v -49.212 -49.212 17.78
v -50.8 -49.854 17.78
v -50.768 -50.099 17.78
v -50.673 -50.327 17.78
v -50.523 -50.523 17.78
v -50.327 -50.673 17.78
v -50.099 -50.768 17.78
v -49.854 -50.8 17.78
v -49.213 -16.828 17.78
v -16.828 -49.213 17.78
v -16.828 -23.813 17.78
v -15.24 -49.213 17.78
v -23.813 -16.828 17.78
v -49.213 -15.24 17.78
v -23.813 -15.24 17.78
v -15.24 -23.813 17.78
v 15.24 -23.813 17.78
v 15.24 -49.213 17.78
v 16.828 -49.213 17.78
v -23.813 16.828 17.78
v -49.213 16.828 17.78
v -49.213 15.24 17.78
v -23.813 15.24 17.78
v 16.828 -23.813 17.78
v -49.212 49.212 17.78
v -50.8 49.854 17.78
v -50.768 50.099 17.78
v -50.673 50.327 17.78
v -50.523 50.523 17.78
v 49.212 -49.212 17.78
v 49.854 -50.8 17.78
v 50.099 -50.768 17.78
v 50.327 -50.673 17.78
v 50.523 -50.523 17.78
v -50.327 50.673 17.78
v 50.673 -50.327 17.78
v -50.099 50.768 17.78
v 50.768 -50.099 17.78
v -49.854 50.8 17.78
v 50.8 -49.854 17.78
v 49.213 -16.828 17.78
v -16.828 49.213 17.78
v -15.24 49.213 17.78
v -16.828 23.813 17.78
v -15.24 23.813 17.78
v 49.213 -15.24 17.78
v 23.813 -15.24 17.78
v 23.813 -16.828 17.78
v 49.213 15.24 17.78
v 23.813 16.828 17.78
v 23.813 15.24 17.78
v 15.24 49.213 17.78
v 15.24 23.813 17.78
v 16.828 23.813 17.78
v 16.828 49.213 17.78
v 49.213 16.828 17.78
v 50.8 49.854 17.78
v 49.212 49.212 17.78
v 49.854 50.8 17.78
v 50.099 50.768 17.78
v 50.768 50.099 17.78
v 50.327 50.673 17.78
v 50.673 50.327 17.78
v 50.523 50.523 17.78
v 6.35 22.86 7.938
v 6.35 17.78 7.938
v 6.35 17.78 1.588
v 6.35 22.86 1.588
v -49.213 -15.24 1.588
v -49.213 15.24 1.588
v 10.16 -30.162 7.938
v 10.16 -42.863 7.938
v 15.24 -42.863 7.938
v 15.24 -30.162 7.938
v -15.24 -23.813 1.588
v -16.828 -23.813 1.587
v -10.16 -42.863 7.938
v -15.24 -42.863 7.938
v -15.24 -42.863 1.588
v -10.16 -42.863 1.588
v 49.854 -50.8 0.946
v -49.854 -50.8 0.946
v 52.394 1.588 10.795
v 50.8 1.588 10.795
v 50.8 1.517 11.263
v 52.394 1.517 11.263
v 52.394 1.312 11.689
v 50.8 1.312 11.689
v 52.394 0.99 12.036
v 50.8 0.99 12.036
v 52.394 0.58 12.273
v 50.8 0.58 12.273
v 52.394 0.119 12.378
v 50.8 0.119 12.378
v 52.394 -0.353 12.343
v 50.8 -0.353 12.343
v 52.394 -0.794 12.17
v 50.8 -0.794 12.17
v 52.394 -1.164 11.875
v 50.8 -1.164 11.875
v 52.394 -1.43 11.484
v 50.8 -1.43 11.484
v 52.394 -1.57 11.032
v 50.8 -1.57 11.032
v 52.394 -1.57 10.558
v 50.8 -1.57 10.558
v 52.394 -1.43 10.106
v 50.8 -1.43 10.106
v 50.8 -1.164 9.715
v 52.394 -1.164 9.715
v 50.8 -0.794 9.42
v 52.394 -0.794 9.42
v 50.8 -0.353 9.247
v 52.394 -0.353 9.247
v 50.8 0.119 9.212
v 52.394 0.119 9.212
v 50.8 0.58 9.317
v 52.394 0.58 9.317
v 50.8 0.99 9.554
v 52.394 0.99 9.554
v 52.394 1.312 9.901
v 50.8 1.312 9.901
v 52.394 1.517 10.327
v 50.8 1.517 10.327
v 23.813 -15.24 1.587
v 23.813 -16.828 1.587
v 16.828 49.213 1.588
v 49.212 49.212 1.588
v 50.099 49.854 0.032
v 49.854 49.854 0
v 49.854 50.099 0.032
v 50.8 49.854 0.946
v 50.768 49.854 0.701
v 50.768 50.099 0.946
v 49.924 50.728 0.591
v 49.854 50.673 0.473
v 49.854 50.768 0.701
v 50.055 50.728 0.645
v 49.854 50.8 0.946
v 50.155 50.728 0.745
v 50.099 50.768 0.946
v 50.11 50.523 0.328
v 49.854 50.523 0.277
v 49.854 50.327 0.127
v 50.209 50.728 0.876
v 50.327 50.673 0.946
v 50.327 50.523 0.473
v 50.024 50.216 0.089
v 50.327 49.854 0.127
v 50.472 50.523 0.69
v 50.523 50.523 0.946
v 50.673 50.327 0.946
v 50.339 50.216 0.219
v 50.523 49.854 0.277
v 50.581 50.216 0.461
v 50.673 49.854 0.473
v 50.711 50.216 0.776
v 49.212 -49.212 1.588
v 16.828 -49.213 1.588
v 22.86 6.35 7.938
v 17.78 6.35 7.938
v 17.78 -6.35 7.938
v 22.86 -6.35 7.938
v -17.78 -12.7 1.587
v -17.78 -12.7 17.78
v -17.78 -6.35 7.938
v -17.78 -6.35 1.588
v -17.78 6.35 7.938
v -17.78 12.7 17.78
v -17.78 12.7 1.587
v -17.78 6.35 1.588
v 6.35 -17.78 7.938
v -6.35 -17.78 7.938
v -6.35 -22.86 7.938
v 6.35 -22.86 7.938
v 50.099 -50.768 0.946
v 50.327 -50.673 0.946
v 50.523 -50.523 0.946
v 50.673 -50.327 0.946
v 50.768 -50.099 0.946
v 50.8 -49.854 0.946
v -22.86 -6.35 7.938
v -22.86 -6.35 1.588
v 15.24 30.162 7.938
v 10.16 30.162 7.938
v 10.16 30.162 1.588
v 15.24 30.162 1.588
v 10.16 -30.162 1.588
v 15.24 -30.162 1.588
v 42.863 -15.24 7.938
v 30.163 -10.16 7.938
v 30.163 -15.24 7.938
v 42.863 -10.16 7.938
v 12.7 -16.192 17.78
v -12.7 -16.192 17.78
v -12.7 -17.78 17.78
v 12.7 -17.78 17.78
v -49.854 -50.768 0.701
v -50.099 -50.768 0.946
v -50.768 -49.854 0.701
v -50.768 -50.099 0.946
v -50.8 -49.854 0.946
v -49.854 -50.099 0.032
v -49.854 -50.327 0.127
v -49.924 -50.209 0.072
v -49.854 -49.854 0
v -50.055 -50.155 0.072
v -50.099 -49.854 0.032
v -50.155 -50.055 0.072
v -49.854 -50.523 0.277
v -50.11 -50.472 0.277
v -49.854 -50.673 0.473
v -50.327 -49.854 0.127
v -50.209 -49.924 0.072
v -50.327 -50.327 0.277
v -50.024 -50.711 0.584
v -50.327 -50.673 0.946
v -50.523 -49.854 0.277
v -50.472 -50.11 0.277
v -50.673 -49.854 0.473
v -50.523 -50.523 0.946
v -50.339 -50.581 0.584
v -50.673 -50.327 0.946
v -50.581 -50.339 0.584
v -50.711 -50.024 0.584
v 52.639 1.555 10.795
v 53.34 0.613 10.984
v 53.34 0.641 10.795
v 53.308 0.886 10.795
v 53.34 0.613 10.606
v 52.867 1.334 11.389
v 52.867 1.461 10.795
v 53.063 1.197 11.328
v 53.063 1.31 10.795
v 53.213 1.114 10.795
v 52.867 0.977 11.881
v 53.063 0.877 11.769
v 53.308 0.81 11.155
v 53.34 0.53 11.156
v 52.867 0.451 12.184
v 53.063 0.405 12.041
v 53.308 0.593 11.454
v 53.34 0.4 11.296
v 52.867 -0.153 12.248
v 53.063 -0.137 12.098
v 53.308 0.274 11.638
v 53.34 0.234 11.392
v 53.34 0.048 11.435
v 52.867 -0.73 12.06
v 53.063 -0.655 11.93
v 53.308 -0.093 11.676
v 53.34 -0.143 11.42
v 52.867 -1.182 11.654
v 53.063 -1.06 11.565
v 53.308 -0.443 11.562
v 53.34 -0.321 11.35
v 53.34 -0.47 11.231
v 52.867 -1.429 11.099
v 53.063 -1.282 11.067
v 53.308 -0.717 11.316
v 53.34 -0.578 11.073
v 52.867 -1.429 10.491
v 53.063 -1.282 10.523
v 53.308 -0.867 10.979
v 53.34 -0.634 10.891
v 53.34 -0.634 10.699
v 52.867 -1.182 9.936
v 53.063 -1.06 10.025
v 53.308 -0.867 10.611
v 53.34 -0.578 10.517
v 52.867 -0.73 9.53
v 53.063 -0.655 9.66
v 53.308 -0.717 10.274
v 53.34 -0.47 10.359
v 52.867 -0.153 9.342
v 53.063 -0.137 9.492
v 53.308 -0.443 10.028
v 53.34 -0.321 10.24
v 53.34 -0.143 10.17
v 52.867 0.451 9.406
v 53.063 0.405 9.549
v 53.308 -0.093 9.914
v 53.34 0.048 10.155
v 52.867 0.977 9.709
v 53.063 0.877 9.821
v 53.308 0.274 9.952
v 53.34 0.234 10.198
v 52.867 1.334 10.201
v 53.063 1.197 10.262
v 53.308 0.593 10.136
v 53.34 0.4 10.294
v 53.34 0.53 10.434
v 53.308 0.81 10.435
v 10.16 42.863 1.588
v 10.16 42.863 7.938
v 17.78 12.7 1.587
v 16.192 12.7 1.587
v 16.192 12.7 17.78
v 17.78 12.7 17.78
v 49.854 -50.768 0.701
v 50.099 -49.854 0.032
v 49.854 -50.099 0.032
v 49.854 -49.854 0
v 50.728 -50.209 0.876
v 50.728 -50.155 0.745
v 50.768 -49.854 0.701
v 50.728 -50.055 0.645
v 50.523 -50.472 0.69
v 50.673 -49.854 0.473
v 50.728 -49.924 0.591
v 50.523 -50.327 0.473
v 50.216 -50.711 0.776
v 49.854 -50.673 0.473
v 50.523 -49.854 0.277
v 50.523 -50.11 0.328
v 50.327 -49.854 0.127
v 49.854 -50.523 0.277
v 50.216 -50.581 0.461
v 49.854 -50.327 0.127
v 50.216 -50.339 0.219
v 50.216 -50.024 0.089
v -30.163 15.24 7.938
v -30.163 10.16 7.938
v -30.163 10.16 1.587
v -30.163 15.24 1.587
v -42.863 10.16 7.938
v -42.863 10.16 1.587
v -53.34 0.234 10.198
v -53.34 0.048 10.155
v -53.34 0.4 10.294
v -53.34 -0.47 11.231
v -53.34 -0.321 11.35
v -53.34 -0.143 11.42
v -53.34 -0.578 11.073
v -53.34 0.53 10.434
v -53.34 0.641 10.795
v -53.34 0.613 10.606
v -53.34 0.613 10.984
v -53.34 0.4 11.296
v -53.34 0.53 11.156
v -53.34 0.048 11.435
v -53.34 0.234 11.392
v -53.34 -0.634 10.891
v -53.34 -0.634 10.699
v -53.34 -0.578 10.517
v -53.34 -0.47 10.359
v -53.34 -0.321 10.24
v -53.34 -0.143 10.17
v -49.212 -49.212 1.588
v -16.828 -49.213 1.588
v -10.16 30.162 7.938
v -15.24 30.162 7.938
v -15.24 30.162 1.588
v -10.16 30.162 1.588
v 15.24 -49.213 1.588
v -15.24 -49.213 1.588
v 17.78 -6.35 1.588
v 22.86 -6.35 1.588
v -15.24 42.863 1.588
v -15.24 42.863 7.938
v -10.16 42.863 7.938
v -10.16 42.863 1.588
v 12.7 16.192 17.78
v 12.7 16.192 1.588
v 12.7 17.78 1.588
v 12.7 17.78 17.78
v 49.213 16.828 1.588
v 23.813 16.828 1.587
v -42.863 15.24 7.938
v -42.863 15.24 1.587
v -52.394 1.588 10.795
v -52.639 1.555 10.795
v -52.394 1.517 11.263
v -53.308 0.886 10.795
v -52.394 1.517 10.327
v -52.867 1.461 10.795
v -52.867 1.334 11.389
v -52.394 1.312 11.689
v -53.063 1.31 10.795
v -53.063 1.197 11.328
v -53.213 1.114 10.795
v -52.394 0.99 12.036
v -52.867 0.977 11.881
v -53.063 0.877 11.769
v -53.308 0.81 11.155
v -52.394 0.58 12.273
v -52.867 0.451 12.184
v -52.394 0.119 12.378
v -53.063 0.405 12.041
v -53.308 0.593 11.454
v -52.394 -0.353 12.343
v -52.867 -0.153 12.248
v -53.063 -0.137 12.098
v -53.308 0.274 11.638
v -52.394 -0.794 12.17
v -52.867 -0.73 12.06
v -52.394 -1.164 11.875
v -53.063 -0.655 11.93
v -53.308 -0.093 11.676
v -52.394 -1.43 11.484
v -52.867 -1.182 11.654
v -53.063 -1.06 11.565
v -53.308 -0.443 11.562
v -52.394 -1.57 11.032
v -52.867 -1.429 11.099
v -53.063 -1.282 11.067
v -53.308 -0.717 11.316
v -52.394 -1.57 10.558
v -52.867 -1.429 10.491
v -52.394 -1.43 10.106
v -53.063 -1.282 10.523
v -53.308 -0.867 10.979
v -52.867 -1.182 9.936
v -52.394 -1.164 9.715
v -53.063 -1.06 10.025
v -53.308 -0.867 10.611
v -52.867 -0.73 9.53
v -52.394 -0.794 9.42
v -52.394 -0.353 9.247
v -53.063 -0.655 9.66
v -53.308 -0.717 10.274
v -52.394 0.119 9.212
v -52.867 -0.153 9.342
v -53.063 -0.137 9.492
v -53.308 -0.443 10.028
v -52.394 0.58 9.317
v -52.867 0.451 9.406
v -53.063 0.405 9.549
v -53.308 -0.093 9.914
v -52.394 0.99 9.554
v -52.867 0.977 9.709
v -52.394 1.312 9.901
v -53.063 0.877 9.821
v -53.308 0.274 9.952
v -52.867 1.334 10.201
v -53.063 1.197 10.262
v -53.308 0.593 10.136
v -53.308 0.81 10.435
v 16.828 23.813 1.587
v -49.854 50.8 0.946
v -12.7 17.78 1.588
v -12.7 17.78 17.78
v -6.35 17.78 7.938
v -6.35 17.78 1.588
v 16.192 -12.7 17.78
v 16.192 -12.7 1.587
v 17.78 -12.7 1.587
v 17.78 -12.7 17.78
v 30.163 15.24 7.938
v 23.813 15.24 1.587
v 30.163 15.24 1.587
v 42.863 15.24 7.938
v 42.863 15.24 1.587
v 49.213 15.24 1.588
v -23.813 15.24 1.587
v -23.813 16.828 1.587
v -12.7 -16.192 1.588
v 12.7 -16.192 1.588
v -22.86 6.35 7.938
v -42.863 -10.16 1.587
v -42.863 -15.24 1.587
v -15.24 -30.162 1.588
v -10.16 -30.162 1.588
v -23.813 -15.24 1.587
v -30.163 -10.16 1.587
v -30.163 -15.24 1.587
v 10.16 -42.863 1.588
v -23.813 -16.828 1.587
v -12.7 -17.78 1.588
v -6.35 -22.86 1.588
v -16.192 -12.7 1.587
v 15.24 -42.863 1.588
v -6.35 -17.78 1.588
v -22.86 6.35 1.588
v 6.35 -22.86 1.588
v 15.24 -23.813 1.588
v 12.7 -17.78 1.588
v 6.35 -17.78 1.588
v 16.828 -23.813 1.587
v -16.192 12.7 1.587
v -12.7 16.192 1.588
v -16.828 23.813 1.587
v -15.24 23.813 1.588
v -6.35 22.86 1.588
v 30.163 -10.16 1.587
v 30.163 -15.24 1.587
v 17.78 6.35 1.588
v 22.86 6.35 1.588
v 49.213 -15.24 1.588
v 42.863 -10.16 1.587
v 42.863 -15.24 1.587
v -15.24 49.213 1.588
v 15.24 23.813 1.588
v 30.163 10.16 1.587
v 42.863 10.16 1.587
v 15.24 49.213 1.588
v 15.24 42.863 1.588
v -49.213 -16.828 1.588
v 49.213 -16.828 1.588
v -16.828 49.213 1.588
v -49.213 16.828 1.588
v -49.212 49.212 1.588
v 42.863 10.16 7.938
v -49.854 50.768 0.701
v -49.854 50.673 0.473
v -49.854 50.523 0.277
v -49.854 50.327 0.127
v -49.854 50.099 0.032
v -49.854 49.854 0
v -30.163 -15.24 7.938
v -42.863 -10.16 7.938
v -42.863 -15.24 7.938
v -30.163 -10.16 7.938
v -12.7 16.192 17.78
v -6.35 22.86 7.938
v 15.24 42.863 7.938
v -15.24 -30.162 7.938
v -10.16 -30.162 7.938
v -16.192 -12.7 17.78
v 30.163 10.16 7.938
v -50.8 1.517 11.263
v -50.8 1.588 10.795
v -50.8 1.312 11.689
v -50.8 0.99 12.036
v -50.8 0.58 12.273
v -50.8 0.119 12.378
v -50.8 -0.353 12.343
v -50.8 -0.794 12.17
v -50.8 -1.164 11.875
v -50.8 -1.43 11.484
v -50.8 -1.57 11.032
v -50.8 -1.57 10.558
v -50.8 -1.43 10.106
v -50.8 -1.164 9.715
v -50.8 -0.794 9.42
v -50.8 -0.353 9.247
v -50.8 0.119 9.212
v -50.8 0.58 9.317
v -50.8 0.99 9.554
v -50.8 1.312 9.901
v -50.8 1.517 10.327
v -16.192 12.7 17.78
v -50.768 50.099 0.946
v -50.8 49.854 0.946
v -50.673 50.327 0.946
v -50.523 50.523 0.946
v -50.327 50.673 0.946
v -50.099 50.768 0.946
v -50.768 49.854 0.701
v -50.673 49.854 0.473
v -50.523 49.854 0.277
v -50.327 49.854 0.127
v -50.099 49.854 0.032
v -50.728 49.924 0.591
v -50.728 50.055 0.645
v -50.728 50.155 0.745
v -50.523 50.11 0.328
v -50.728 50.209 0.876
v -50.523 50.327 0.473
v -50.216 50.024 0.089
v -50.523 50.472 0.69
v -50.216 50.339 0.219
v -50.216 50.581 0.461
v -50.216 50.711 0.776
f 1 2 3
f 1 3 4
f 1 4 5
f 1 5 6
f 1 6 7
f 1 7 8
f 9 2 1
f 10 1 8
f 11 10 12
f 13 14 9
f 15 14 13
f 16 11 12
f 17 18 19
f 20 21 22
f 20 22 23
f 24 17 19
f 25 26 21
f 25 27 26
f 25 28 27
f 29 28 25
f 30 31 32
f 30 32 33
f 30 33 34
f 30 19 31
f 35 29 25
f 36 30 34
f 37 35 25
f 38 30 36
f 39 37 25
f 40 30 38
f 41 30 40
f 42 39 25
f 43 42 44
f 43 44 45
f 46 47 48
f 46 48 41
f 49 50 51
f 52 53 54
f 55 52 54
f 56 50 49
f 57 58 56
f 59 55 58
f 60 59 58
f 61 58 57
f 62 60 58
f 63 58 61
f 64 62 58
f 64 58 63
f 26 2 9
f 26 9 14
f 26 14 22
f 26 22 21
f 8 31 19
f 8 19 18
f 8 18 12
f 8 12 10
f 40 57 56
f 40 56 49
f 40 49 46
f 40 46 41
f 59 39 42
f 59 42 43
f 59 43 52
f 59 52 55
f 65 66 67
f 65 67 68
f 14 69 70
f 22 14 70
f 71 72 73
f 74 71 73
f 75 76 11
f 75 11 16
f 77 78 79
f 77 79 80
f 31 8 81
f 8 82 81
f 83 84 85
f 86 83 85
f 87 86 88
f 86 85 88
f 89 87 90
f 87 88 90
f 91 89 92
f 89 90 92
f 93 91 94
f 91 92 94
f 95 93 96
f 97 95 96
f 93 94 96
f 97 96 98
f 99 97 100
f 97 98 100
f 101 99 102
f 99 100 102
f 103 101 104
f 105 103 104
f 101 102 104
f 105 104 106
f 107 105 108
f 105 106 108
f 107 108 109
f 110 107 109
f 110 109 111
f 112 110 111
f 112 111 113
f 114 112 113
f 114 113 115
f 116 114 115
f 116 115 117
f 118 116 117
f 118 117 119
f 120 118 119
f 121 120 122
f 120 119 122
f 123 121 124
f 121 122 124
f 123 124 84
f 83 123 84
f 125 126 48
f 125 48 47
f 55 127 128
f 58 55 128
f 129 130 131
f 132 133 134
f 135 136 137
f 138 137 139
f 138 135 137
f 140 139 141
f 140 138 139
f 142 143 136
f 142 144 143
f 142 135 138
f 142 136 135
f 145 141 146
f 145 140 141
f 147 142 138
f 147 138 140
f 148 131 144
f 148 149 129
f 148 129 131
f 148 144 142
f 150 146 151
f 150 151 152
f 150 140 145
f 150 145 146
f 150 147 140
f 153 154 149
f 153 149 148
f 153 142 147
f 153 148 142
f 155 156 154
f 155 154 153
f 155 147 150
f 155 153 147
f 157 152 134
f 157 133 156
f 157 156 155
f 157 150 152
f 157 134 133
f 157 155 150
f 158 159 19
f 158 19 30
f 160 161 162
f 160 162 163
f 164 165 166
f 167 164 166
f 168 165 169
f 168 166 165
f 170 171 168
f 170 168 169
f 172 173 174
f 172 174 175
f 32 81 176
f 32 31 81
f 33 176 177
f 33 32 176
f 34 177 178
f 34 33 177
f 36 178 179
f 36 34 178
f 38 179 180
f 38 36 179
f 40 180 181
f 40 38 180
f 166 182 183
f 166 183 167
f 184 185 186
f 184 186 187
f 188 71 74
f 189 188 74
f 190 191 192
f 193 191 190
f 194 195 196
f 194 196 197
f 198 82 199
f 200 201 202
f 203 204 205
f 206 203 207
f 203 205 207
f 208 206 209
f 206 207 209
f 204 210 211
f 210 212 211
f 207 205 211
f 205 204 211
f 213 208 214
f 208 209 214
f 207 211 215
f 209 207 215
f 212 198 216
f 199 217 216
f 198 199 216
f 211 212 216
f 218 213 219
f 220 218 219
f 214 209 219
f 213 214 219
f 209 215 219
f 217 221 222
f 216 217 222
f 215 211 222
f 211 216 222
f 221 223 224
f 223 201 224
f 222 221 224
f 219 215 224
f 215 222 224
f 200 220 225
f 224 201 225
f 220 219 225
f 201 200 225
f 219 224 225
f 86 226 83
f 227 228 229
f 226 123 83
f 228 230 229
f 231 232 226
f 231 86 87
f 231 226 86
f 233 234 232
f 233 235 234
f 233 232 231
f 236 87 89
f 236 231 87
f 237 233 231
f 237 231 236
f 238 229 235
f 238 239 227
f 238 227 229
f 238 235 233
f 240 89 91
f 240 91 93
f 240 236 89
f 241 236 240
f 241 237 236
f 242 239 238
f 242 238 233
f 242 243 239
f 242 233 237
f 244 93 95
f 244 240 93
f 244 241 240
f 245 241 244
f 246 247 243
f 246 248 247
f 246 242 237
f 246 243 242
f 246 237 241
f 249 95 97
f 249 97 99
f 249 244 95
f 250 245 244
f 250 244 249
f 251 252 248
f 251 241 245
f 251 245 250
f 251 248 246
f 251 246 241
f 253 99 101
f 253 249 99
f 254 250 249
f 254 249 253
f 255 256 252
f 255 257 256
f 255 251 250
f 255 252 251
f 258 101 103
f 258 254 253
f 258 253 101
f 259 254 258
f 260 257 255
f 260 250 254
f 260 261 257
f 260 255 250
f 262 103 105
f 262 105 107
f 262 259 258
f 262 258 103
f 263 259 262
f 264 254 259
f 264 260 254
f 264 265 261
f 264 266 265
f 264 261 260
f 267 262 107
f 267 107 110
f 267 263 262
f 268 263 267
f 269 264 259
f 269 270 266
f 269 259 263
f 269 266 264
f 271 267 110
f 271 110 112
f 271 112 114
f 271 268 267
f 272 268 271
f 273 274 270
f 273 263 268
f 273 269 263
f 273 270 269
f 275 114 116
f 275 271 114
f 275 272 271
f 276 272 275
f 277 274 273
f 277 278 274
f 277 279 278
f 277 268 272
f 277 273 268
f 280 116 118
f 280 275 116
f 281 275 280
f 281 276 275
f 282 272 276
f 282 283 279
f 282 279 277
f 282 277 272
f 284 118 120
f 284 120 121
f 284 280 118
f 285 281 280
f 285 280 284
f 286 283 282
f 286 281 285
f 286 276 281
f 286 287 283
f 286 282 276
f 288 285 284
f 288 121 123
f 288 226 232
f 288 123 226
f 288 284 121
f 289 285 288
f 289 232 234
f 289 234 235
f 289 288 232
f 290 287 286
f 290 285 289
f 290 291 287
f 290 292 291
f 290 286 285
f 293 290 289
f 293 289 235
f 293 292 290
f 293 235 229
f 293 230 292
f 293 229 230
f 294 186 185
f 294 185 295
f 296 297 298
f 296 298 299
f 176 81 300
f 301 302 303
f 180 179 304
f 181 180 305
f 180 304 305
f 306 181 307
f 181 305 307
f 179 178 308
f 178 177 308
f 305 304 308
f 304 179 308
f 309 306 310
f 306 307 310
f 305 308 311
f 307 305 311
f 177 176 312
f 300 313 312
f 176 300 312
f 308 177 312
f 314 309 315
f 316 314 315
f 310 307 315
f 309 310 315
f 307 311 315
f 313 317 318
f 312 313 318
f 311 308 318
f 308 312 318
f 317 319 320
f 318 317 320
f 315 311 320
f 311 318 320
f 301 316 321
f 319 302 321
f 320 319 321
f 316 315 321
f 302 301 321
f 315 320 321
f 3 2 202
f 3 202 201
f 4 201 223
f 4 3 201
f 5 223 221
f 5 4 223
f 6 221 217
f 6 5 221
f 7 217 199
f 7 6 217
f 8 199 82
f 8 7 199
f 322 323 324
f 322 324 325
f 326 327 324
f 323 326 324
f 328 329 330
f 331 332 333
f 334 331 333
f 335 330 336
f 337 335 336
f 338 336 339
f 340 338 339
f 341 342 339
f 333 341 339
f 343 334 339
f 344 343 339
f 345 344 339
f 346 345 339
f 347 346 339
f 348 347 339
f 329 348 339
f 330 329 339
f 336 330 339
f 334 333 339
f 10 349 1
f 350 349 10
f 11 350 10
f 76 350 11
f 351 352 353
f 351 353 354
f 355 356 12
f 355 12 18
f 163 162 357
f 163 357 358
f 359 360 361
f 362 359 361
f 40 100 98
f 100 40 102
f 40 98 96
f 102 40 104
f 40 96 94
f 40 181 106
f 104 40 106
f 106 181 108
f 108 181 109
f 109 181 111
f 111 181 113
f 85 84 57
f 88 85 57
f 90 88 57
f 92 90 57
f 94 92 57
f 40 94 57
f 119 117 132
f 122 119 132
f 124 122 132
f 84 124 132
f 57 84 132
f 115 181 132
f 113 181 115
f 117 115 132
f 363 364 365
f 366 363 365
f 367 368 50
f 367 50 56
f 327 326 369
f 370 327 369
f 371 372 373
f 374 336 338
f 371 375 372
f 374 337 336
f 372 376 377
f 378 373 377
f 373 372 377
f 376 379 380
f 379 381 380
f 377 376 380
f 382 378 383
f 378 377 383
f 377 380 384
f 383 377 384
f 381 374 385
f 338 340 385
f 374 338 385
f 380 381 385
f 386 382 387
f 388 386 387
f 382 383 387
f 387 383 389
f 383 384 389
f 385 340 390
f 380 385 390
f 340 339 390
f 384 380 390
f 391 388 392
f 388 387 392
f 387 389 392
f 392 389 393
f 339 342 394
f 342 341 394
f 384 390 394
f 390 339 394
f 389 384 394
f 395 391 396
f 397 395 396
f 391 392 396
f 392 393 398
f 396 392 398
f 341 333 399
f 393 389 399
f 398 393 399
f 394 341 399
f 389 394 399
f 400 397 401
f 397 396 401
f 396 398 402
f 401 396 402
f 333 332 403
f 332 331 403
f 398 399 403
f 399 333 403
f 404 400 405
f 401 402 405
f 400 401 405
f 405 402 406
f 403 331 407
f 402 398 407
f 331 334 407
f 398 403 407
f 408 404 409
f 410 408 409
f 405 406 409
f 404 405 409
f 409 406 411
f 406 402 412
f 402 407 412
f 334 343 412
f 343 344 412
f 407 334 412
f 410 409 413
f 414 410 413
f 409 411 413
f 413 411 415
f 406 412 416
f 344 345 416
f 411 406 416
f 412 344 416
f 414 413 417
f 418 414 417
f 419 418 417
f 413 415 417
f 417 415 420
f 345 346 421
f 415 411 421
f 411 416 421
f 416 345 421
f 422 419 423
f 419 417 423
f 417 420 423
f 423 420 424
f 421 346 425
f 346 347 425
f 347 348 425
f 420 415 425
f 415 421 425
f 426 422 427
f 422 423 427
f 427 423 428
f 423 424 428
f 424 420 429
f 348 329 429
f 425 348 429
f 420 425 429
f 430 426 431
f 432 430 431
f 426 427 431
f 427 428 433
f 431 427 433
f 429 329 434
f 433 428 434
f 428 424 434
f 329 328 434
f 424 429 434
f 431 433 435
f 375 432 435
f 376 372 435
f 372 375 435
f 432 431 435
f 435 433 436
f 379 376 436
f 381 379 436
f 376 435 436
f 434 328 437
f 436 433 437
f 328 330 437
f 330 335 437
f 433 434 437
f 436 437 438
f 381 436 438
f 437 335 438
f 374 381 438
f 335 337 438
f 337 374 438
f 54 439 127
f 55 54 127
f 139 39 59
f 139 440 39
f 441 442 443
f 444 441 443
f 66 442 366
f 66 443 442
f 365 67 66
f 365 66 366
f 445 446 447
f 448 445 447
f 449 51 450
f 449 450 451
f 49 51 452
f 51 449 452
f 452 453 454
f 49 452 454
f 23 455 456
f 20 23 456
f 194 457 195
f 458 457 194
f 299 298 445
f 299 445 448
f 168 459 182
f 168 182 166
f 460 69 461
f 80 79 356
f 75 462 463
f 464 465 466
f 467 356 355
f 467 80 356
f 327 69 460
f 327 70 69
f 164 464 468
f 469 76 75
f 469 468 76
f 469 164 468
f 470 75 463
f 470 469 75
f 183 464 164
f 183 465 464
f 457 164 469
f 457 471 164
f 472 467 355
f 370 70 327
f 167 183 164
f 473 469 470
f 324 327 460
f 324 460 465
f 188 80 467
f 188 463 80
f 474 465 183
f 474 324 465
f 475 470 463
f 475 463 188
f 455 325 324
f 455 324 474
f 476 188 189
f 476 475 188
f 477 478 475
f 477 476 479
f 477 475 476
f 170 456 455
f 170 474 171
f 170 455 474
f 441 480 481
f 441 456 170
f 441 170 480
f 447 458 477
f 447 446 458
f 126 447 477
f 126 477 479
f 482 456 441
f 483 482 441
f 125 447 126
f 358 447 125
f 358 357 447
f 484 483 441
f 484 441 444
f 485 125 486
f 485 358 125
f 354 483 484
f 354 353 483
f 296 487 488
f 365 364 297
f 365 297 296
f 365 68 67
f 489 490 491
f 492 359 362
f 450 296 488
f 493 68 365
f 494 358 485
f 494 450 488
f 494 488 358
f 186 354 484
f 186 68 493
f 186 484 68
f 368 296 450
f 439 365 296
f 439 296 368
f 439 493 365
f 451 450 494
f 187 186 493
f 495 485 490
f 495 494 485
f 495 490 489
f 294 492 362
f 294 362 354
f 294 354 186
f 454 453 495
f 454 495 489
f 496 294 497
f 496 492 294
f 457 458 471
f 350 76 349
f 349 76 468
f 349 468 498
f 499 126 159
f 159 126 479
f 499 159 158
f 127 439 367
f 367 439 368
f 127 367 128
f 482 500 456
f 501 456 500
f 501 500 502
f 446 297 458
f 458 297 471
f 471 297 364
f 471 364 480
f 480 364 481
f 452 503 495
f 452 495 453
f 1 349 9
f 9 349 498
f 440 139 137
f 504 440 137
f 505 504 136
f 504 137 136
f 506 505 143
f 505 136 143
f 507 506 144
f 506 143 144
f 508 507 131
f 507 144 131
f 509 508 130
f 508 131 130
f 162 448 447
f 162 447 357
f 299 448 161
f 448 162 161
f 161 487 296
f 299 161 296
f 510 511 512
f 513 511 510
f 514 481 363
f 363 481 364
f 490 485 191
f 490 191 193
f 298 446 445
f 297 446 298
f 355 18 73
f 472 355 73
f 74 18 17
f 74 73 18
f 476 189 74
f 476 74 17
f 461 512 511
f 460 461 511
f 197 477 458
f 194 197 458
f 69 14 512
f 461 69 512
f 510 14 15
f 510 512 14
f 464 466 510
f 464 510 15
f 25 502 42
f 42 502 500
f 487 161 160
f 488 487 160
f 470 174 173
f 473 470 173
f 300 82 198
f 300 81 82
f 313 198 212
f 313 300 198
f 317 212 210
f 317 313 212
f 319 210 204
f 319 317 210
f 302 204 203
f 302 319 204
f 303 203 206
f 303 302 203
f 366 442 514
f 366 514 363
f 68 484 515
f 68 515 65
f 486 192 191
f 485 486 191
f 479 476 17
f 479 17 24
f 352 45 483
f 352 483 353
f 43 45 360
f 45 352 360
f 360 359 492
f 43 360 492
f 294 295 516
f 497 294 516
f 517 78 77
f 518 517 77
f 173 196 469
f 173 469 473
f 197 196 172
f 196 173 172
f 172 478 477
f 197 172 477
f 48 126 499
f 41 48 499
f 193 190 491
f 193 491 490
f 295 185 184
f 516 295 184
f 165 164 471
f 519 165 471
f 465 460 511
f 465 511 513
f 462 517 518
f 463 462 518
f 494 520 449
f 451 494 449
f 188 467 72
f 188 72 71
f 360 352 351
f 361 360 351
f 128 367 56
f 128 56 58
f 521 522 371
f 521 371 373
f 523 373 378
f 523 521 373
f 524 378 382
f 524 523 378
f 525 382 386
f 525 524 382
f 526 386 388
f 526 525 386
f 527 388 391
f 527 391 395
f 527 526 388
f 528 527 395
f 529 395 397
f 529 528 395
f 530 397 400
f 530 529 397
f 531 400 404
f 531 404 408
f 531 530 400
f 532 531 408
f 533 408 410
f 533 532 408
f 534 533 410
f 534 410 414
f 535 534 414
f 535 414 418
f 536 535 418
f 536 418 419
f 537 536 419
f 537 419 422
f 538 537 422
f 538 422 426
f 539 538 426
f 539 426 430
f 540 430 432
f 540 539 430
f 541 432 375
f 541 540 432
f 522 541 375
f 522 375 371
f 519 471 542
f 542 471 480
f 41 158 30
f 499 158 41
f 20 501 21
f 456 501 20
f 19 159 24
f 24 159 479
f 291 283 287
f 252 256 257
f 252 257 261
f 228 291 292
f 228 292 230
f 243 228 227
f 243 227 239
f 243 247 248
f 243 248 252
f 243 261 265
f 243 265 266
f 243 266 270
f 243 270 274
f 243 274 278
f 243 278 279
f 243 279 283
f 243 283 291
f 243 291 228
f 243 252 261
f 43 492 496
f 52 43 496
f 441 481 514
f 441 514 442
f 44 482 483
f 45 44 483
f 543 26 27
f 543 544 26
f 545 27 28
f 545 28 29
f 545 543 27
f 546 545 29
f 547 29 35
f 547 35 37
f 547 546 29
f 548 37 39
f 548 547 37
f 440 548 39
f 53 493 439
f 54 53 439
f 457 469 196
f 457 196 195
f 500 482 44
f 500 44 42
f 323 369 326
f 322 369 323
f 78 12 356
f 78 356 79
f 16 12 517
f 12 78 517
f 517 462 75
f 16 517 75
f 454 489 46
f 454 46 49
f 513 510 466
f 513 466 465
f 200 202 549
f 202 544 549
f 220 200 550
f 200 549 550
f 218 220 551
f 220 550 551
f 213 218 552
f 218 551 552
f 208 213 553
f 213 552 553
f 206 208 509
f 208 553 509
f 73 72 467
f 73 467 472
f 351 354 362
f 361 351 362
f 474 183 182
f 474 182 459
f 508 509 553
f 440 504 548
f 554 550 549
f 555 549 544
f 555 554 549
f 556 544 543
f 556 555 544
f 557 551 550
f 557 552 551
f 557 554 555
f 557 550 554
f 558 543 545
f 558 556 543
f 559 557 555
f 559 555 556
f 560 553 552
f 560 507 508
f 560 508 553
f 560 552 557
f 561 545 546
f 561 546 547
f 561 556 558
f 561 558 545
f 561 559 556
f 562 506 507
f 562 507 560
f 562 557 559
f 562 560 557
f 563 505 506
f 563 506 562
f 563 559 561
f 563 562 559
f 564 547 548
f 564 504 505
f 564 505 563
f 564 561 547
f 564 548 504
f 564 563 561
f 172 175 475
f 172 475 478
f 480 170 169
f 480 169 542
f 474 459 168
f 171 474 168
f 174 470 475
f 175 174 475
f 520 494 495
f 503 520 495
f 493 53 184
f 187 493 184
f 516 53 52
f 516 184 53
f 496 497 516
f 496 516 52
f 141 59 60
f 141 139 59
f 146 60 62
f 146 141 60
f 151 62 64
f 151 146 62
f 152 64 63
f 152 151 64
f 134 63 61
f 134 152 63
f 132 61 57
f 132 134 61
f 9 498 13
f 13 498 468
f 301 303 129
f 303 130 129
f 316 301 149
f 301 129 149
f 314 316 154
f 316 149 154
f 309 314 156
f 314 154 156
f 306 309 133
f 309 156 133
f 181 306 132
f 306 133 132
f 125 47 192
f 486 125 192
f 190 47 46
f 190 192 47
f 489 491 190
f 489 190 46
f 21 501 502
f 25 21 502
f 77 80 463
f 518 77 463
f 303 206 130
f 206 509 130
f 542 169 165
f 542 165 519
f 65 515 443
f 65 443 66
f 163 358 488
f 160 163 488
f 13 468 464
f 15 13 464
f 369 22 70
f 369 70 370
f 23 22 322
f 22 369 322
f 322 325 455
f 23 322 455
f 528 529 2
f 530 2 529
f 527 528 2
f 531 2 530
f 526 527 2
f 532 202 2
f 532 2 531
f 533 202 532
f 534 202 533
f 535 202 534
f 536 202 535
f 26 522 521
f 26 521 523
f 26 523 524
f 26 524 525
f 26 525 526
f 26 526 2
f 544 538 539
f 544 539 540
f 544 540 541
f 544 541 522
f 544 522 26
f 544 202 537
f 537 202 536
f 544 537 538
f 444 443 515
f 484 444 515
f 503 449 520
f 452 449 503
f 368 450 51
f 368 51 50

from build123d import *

# Parameters (mm, degrees)
F0_W     = 101.6
F0_H     = 101.6
F1_DEPTH = 1.5875
F2_W     = 101.6
F2_H     = 101.6
F2_W_2   = 98.425
F2_H_2   = 98.425
F3_DEPTH = 16.1925
F4_W     = 25.4
F4_H     = 1.5875
F4_W_2   = 1.5875
F4_H_2   = 25.4
F5_DEPTH = 16.1925
F6_W     = 12.7
F6_H     = 5.08
F6_W_2   = 5.08
F6_H_2   = 12.7
F7_DEPTH = 6.35
F8_R     = 1.5875
F9_DEPTH = 2.54
F11_R    = 0.94615


with BuildPart() as f1:
    # F0 (on Top) → F1 (new body)
    with BuildSketch(Plane.XY):
        Rectangle(F0_W, F0_H)
    extrude(amount=F1_DEPTH)

    # F2 (on face) → F3 (join)
    with BuildSketch(Plane.XY.offset(1.5875)):
        Rectangle(F2_W, F2_H)
        Rectangle(F2_W_2, F2_H_2, mode=Mode.SUBTRACT)
    extrude(amount=F3_DEPTH)

    # F4 (on face) → F5 (join, through all)
    with BuildSketch(Plane.XY.offset(1.5875)):
        with Locations((-36.5125, -16.03375)):
            Rectangle(F4_W, F4_H)
        with Locations((36.5125, -16.03375)):
            Rectangle(F4_W, F4_H)
        with Locations((-36.5125, 16.03375)):
            Rectangle(F4_W, F4_H)
        with Locations((36.5125, 16.03375)):
            Rectangle(F4_W, F4_H)
        with Locations((16.03375, 36.5125)):
            Rectangle(F4_W_2, F4_H_2)
        with Locations((-16.03375, 36.5125)):
            Rectangle(F4_W_2, F4_H_2)
        with Locations((-16.03375, -36.5125)):
            Rectangle(F4_W_2, F4_H_2)
        with Locations((16.03375, -36.5125)):
            Rectangle(F4_W_2, F4_H_2)
        with Locations((0, 16.98625)):
            Rectangle(F4_W, F4_H)
        with Locations((0, -16.98625)):
            Rectangle(F4_W, F4_H)
        with Locations((-16.98625, 0)):
            Rectangle(F4_W_2, F4_H_2)
        with Locations((16.98625, 0)):
            Rectangle(F4_W_2, F4_H_2)
    extrude(amount=F5_DEPTH)

    # F6 (on face) → F7 (join)
    with BuildSketch(Plane.XY.offset(1.5875)):
        with Locations((-36.5125, 12.7)):
            Rectangle(F6_W, F6_H)
        with Locations((-36.5125, -12.7)):
            Rectangle(F6_W, F6_H)
        with Locations((-12.7, 36.5125)):
            Rectangle(F6_W_2, F6_H_2)
        with Locations((12.7, 36.5125)):
            Rectangle(F6_W_2, F6_H_2)
        with Locations((36.5125, 12.7)):
            Rectangle(F6_W, F6_H)
        with Locations((36.5125, -12.7)):
            Rectangle(F6_W, F6_H)
        with Locations((12.7, -36.5125)):
            Rectangle(F6_W_2, F6_H_2)
        with Locations((-12.7, -36.5125)):
            Rectangle(F6_W_2, F6_H_2)
        with Locations((0, -20.32)):
            Rectangle(F6_W, F6_H)
        with Locations((20.32, 0)):
            Rectangle(F6_W_2, F6_H_2)
        with Locations((-20.32, 0)):
            Rectangle(F6_W_2, F6_H_2)
        with Locations((0, 20.32)):
            Rectangle(F6_W, F6_H)
    extrude(amount=F7_DEPTH)

    # F8 (on face) → F9 (join)
    with BuildSketch(Plane.YZ.offset(50.8)):
        with Locations((0, 10.795)):
            Circle(F8_R)
    extrude(amount=F9_DEPTH)

    # F10: F1 across plane


with BuildPart() as f1_1:
    add(f1.part)
    add(f1.part.mirror(Plane.YZ))

    # F11
    f11_edges = [f1_1.edges().sort_by_distance(p)[0] for p in [
        (-53.34, -1.5875, 10.795),
        (-50.8, -50.8, 8.89),
        (0, -50.8, 0),
        (50.8, -50.8, 8.89),
        (53.34, -1.5875, 10.795),
        (50.8, 0, 0),
        (0, 50.8, 0),
        (50.8, 50.8, 8.89),
        (-50.8, 0, 0),
        (-50.8, 50.8, 8.89),
    ]]
    fillet(f11_edges, radius=F11_R)


solid = f1_1.part
